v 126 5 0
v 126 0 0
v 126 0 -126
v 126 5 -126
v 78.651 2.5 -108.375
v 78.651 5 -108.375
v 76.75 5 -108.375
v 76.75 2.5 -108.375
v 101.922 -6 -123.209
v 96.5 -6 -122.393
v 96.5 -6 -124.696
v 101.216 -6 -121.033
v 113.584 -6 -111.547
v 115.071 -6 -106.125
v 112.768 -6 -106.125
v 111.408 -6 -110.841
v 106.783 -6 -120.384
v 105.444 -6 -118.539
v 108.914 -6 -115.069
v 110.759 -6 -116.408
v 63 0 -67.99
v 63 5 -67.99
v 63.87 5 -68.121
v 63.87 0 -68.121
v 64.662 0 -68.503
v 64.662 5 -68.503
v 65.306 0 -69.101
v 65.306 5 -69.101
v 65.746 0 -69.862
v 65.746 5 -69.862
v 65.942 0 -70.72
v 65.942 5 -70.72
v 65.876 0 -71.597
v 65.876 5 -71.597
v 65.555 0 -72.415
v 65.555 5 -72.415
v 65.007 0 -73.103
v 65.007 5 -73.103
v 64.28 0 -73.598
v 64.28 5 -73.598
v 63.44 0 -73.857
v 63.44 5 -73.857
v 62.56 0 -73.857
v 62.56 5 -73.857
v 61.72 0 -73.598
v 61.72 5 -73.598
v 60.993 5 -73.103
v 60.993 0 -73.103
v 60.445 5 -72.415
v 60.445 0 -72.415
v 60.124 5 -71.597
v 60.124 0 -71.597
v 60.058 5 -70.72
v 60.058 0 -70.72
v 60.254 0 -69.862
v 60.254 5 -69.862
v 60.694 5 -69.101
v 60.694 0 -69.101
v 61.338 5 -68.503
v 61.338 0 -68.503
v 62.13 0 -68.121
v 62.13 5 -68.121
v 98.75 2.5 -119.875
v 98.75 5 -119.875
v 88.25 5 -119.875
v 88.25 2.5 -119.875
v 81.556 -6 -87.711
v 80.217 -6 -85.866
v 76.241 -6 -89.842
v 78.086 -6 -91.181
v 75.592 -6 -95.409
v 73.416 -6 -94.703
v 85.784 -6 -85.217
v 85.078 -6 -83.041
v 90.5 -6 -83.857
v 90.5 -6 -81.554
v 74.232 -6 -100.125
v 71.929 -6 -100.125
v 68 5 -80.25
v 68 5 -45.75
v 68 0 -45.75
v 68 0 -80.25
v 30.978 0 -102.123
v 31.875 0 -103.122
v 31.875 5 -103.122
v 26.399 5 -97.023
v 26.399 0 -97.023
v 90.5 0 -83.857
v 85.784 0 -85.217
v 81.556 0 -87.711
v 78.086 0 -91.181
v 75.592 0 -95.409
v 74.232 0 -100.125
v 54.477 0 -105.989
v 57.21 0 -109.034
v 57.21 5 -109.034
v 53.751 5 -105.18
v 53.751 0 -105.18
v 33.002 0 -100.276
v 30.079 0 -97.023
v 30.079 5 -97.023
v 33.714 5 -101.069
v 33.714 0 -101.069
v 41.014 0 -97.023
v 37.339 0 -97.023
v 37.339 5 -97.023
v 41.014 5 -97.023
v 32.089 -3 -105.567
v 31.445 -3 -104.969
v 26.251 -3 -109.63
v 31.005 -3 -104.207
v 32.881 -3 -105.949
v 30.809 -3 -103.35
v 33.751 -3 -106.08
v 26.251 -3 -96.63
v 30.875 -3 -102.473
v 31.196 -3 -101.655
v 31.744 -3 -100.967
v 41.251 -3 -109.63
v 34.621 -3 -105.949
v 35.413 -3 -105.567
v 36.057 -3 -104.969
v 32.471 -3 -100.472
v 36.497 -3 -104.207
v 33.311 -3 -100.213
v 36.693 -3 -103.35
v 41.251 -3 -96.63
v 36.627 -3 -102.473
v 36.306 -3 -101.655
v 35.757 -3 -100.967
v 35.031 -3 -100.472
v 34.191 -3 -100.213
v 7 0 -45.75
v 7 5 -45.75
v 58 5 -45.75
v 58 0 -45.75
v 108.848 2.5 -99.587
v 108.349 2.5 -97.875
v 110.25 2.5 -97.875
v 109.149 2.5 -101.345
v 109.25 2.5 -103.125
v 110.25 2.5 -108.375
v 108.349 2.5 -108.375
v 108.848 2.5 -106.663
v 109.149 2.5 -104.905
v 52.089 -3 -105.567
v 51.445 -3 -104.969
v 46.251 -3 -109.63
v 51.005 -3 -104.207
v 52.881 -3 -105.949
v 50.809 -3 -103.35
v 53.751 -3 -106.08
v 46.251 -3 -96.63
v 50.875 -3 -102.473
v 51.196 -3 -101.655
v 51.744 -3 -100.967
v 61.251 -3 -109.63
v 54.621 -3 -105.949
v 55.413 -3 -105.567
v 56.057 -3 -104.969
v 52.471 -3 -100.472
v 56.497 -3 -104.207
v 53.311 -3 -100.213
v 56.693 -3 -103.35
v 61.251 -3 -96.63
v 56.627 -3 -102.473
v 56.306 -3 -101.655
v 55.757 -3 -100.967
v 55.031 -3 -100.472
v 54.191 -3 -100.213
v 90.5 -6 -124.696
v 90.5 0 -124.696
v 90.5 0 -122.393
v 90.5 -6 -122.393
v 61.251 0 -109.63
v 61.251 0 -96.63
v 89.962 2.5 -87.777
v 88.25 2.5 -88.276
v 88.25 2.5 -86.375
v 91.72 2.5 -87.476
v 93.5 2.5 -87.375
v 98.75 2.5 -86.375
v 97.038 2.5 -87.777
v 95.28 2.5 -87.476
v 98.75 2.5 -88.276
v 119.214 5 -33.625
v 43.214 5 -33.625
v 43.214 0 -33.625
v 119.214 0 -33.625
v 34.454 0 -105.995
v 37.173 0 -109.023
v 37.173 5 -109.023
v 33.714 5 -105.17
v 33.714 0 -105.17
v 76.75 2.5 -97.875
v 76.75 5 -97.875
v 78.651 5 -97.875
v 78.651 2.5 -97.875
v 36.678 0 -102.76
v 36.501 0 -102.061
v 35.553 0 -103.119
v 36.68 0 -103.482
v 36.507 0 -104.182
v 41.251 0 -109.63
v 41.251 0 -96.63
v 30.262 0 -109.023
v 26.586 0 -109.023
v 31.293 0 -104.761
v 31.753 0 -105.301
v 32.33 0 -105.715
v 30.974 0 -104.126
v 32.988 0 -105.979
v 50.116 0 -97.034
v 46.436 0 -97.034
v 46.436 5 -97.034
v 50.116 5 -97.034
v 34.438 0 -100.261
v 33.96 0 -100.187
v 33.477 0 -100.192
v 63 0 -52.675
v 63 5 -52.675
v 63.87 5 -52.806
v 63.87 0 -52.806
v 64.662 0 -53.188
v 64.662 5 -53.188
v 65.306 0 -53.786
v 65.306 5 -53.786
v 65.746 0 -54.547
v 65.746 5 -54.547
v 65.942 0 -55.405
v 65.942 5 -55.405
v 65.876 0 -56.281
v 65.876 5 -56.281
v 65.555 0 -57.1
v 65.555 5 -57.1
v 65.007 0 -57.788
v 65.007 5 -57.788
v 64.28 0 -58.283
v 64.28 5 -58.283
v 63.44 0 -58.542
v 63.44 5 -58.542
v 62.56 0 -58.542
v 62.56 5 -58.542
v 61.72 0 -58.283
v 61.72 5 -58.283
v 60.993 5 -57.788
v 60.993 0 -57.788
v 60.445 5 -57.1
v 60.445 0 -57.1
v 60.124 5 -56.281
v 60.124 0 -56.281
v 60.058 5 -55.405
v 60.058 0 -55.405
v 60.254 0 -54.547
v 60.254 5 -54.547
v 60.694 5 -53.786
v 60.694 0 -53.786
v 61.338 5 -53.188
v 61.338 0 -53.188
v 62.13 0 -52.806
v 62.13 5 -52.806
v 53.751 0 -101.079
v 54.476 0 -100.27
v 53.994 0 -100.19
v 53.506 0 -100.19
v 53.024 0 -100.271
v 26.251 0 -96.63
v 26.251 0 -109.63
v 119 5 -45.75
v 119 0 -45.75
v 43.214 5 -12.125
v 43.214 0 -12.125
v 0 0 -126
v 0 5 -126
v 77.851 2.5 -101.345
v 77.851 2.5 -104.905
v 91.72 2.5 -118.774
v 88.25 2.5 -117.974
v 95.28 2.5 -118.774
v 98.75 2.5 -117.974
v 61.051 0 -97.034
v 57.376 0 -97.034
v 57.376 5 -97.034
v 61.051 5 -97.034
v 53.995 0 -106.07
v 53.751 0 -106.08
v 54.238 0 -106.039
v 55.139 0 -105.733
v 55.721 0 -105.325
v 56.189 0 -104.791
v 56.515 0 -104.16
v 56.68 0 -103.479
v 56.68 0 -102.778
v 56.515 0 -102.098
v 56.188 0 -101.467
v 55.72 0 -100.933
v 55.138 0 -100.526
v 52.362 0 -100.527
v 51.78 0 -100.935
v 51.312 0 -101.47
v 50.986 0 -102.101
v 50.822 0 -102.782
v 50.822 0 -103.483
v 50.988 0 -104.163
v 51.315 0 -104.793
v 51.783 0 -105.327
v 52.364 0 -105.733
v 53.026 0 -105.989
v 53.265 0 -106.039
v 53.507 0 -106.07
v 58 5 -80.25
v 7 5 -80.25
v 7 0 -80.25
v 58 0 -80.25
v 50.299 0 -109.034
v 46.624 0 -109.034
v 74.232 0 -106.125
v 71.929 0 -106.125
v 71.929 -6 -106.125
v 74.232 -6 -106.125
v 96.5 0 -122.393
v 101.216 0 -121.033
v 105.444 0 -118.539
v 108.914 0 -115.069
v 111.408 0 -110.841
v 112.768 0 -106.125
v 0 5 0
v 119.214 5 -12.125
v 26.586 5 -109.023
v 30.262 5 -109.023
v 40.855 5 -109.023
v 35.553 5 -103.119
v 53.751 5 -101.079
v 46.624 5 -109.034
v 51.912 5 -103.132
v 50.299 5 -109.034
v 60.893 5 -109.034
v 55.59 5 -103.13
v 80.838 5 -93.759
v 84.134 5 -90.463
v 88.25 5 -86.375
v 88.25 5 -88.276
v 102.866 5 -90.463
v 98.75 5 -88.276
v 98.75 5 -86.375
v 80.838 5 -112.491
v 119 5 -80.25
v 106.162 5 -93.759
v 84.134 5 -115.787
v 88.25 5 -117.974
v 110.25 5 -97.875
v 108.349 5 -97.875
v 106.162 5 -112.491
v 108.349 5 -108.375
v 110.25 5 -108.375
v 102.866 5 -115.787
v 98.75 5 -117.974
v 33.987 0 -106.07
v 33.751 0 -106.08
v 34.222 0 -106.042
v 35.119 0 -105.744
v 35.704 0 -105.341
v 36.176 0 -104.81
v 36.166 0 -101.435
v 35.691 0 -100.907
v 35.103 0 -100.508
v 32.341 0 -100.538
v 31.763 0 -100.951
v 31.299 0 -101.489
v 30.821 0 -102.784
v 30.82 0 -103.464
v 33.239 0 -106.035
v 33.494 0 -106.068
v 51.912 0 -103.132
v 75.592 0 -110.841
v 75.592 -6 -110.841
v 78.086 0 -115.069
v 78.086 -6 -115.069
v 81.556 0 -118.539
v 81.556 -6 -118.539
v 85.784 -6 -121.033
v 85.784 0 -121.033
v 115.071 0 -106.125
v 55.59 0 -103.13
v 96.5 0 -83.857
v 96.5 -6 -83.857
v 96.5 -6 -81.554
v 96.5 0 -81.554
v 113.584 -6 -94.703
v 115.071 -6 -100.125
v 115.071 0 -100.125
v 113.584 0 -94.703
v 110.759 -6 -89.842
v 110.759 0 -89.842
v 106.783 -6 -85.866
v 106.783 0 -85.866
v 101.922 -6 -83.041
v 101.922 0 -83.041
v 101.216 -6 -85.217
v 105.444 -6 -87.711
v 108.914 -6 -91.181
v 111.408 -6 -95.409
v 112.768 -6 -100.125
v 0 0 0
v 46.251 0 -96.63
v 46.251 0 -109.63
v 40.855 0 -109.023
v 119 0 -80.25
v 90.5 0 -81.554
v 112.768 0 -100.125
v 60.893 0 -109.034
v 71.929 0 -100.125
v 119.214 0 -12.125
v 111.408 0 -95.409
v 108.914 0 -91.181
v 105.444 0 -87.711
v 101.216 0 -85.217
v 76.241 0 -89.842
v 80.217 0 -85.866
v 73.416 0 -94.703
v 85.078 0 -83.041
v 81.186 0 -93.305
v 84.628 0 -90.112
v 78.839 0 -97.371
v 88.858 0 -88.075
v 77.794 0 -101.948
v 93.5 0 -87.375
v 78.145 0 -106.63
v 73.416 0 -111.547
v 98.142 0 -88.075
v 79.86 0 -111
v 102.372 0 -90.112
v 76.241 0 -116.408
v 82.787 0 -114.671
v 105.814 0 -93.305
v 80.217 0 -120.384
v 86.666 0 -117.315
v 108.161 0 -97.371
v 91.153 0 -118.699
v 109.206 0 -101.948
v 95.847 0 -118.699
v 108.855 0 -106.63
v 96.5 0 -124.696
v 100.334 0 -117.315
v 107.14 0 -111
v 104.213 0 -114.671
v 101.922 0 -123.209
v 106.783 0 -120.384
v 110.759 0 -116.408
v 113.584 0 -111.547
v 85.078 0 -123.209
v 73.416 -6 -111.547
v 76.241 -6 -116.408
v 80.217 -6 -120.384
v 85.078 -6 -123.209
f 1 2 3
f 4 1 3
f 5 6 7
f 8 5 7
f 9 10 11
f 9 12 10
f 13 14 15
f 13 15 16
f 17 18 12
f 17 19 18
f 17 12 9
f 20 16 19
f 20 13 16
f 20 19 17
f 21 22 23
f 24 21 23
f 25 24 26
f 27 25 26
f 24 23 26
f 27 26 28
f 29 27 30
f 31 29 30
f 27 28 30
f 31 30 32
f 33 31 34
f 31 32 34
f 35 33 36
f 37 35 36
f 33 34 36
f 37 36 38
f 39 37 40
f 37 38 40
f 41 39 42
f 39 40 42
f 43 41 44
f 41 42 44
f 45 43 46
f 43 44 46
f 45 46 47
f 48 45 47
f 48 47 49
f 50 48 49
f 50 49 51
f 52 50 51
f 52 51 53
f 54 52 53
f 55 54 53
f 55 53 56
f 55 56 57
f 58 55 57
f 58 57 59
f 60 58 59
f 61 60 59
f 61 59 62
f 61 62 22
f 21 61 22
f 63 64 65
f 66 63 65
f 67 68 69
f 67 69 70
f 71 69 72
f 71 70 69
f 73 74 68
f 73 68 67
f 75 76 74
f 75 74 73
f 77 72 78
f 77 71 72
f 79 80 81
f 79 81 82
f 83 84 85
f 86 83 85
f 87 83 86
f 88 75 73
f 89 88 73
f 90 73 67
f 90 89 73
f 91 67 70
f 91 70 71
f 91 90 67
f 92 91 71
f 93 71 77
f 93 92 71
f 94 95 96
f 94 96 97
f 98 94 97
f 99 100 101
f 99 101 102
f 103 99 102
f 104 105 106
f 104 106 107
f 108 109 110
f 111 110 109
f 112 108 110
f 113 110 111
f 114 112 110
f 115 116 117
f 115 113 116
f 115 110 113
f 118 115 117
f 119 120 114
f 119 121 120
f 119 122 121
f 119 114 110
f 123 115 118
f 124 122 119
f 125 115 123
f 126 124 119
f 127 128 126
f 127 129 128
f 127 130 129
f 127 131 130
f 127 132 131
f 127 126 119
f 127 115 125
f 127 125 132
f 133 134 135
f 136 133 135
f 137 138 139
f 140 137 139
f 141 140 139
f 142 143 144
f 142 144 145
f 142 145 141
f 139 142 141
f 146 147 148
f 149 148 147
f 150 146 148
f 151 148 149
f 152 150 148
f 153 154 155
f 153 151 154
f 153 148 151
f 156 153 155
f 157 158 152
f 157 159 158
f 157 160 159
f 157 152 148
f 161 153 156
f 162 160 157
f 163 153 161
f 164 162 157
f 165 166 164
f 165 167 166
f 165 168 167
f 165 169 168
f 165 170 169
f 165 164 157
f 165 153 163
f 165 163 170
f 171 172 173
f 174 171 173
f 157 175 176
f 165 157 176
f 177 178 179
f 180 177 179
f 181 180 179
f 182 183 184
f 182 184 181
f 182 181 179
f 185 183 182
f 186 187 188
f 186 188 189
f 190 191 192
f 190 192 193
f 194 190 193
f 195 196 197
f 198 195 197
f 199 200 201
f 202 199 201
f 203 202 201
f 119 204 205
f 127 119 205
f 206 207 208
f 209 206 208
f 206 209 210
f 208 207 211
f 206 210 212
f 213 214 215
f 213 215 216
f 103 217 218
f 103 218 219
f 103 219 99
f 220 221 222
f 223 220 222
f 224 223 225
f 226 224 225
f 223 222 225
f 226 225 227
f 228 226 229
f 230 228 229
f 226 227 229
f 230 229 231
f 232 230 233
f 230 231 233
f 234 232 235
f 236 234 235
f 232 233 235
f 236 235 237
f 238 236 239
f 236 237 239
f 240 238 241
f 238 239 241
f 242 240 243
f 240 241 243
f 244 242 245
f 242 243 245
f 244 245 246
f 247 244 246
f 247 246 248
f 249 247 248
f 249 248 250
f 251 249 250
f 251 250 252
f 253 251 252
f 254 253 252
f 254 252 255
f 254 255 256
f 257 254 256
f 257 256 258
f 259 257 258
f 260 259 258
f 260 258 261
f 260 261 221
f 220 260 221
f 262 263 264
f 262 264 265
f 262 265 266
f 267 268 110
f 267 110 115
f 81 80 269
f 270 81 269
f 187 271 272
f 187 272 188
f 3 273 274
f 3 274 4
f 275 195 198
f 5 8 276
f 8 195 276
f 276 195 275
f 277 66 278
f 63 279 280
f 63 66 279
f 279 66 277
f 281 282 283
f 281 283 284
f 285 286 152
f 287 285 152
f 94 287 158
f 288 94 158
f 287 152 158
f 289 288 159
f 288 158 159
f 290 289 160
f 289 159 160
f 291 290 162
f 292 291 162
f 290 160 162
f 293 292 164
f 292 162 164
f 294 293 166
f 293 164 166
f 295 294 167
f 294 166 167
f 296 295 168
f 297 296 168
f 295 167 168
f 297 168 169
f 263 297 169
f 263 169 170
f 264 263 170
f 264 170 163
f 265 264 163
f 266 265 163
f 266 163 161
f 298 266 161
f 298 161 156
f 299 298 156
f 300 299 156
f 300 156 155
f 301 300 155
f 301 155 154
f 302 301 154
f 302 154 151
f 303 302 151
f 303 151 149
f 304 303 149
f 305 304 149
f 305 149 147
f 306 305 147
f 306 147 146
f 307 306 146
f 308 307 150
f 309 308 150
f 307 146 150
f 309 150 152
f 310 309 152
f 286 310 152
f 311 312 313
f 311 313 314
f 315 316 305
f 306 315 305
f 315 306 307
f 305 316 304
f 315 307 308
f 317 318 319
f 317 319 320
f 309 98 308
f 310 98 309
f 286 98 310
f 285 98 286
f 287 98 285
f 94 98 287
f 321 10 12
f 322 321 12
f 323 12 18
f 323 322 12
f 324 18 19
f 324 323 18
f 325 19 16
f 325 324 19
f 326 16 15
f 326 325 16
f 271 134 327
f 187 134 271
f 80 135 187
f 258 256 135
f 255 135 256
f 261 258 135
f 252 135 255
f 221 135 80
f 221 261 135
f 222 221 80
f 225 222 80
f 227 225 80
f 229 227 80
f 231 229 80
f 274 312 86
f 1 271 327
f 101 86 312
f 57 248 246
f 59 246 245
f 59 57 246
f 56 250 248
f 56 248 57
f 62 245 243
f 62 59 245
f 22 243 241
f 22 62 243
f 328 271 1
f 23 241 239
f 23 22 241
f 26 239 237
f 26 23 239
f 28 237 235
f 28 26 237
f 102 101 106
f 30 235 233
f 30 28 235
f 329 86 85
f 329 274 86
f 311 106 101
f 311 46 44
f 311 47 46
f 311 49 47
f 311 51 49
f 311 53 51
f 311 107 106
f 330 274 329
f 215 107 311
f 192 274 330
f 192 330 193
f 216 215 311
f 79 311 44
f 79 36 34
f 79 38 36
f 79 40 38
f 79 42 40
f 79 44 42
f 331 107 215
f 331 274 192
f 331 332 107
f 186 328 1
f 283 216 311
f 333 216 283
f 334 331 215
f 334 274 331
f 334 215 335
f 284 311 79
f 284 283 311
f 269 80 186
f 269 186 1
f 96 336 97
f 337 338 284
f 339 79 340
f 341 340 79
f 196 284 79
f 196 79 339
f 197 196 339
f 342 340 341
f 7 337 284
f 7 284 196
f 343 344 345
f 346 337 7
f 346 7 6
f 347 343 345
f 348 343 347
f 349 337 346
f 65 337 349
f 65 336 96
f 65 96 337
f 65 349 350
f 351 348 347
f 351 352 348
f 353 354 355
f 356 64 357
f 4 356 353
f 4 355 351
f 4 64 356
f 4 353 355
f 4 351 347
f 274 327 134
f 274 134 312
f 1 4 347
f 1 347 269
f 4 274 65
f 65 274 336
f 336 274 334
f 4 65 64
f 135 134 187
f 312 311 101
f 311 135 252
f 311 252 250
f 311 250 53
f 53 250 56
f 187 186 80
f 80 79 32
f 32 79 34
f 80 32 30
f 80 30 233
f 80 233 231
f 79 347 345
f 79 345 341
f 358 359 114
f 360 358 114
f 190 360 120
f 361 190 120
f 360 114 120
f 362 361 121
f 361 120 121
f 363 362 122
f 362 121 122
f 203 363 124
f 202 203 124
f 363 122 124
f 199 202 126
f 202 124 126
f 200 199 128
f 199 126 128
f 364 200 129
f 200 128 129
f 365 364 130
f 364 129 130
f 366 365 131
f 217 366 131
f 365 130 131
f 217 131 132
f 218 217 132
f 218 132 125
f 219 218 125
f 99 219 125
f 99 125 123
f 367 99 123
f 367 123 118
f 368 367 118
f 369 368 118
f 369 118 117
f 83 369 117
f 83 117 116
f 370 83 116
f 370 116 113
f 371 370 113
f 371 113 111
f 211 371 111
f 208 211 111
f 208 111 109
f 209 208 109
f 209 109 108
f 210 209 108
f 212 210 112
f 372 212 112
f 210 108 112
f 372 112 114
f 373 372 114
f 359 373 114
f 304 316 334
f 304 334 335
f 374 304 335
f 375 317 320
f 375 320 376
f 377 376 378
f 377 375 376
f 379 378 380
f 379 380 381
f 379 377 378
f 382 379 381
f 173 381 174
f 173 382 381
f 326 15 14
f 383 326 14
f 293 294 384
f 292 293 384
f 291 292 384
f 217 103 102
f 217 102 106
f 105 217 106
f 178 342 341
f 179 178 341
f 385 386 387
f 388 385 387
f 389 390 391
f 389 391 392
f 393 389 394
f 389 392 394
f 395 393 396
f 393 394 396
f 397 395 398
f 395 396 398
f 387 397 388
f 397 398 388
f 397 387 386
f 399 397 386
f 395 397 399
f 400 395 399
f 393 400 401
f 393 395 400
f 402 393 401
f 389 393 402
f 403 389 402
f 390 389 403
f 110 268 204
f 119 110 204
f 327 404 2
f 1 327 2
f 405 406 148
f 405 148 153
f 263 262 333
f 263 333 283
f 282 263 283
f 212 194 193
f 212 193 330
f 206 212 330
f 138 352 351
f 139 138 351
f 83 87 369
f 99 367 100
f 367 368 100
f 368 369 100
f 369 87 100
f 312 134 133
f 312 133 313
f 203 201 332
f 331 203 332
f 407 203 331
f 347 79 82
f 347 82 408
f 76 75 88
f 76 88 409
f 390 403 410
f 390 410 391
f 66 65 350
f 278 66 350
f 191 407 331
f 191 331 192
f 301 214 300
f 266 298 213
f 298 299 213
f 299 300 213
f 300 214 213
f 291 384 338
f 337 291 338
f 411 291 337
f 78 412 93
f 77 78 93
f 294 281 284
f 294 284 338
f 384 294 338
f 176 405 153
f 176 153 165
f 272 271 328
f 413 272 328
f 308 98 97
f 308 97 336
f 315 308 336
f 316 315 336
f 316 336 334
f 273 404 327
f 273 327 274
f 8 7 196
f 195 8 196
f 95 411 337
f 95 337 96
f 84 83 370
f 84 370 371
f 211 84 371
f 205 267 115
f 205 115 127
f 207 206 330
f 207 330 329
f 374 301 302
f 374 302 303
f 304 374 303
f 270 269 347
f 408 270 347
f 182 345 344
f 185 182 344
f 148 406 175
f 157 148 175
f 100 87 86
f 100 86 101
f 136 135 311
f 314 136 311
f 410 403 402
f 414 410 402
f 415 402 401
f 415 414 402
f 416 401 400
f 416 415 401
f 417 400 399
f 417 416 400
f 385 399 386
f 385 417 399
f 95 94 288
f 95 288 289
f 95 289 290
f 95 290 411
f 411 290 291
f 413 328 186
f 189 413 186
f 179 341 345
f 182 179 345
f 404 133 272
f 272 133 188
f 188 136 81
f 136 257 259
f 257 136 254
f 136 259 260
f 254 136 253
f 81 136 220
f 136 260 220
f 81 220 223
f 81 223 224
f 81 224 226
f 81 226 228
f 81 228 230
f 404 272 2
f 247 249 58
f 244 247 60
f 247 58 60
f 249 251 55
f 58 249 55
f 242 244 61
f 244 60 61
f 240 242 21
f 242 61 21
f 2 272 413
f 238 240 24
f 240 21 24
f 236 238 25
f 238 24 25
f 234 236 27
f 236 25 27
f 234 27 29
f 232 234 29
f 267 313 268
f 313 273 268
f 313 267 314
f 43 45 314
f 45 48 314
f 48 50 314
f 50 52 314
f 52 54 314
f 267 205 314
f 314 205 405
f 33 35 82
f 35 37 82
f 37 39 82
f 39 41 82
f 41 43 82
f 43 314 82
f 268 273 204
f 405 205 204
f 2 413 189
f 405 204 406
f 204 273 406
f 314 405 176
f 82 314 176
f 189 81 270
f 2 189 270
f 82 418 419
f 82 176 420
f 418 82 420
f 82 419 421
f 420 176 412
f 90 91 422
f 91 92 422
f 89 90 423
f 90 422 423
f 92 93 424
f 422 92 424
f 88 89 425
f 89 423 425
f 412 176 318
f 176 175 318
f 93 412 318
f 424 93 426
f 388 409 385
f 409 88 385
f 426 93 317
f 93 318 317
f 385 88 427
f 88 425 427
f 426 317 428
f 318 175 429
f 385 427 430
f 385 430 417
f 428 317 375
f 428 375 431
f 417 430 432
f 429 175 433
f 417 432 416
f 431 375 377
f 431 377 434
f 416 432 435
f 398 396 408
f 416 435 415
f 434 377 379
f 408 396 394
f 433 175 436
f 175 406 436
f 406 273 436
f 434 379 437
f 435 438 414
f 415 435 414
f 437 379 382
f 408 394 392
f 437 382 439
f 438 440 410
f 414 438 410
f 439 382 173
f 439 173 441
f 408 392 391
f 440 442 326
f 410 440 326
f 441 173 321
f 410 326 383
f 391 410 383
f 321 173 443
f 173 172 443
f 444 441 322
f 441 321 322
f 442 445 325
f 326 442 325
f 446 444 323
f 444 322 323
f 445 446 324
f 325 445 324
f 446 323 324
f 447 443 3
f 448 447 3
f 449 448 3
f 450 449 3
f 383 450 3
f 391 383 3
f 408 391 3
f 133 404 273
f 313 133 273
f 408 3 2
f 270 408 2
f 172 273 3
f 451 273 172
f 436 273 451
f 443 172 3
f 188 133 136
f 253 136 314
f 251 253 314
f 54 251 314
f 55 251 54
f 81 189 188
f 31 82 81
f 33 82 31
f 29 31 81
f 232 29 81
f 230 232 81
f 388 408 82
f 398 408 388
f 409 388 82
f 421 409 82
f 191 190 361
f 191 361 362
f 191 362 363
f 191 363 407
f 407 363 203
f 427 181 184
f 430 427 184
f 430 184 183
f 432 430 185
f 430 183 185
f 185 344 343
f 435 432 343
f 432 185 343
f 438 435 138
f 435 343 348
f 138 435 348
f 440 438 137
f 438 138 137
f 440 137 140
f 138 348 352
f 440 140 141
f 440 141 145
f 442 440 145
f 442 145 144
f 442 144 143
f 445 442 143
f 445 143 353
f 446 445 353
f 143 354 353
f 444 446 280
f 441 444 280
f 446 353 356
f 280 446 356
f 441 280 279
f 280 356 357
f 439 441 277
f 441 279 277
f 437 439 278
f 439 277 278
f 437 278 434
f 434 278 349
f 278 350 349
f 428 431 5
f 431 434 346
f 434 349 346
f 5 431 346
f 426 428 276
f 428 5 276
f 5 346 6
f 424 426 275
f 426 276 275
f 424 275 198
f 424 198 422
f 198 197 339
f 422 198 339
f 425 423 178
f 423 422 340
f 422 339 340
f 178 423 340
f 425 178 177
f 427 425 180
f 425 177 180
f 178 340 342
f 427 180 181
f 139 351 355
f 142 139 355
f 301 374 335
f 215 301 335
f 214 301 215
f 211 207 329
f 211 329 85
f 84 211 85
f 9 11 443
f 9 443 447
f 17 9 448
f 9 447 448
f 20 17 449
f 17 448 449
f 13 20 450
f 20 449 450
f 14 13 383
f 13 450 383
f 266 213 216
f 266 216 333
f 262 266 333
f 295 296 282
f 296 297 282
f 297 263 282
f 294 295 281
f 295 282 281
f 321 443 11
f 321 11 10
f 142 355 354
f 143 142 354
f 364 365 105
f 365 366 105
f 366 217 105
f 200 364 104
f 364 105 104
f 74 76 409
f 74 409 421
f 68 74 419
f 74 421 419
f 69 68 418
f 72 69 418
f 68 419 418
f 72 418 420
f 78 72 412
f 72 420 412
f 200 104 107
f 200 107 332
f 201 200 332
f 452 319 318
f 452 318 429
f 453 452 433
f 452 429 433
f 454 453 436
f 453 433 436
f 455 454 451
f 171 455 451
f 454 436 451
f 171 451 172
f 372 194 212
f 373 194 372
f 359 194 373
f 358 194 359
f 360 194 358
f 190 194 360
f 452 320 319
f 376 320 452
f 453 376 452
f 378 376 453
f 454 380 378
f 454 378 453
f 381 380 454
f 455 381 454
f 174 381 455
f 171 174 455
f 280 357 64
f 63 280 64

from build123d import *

# Parameters (mm, degrees)
SKETCH1_W           = 126
SKETCH1_H           = 126
BOSS_EXTRUDE1_DEPTH = 5
SKETCH4_W           = 76
SKETCH4_H           = 21.5
CUT_EXTRUDE3_DEPTH  = 10
CUT_EXTRUDE4_START  = -5
CUT_EXTRUDE4_DEPTH  = 5
SKETCH11_W          = 15
SKETCH11_H          = 13
BOSS_EXTRUDE2_DEPTH = 3
SKETCH12_R          = 2.95
CUT_EXTRUDE5_DEPTH  = 3
LPATTERN1_COUNT     = 2
LPATTERN1_PITCH     = 20
LPATTERN2_COUNT     = 2
LPATTERN2_PITCH     = 20
SKETCH13_W          = 51
SKETCH13_H          = 34.5
CUT_EXTRUDE6_DEPTH  = 179.370401132
SKETCH14_W          = 51
SKETCH14_H          = 34.5
CUT_EXTRUDE7_DEPTH  = 179.370401132
SKETCH17_R          = 2.95
CUT_EXTRUDE10_DEPTH = 179.370401132
SKETCH18_R          = 21.778665512
SKETCH18_R_2        = 19.5
BOSS_EXTRUDE3_DEPTH = 6
SKETCH19_W          = 44.860431558
SKETCH19_H          = 6
SKETCH19_W_2        = 6
SKETCH19_H_2        = 44.549983506
CUT_EXTRUDE11_DEPTH = 6
SKETCH21_R          = 15.75
CUT_EXTRUDE14_DEPTH = 179.530109505
CUT_EXTRUDE15_DEPTH = 2.5


# Read off the part's stored shape, not the designer's step: Cut-Extrude4
with BuildPart() as part:
    # Sketch1 → Boss-Extrude1 (new body)
    with BuildSketch(Plane(origin=(0, 0, 0), x_dir=(1, 0, 0), z_dir=(0, 1, 0))):
        with Locations((63, 63)):
            Rectangle(SKETCH1_W, SKETCH1_H)
    extrude(amount=BOSS_EXTRUDE1_DEPTH)

    # Sketch4 → Cut-Extrude3 (cut)
    with BuildSketch(Plane(origin=(0, 5, 0), x_dir=(1, 0, 0), z_dir=(0, 1, 0))):
        with Locations((81.213909597, 22.875)):
            Rectangle(SKETCH4_W, SKETCH4_H)
    extrude(amount=-CUT_EXTRUDE3_DEPTH, mode=Mode.SUBTRACT)

    # Cut-Extrude4 outline → Cut-Extrude4 (cut)
    with BuildSketch(Plane(origin=(0, 5, 0), x_dir=(1, 0, 0), z_dir=(0, 1, 0)).offset(CUT_EXTRUDE4_START)):
        Polygon((46.623568796, 109.033538796), (51.912030335, 103.132096488), (46.436068796, 97.033538796), (50.116357258, 97.033538796), (53.750972642, 101.079211873), (57.375972642, 97.033538796), (61.051453412, 97.033538796), (55.58991495, 103.129692642), (60.892799565, 109.033538796), (57.210107258, 109.033538796), (53.750972642, 105.180173411), (50.299049565, 109.033538796), align=None)
        Polygon((26.586259271, 109.023073742), (31.87472081, 103.121631435), (26.398759271, 97.023073742), (30.079047733, 97.023073742), (33.713663117, 101.068746819), (37.338663117, 97.023073742), (41.014143886, 97.023073742), (35.552605425, 103.119227588), (40.85549004, 109.023073742), (37.172797733, 109.023073742), (33.713663117, 105.169708358), (30.26174004, 109.023073742), align=None)
    extrude(amount=CUT_EXTRUDE4_DEPTH, mode=Mode.SUBTRACT)

    # Sketch11 → Boss-Extrude2 (add)
    with BuildSketch(Plane.XZ):
        with Locations((53.750972642, -103.129692642)):
            Rectangle(SKETCH11_W, SKETCH11_H)
    boss_extrude2 = extrude(amount=BOSS_EXTRUDE2_DEPTH)

    # Sketch12 → Cut-Extrude5 (cut)
    with BuildSketch(Plane.XZ.offset(3)):
        with Locations(Location((53.750972642, -103.129692642, 0), (0, 0, 270))):
            Circle(SKETCH12_R)
    cut_extrude5 = extrude(amount=-CUT_EXTRUDE5_DEPTH, mode=Mode.SUBTRACT)

    # LPattern1: Boss-Extrude2 ×2
    with Locations(*[(-i * LPATTERN1_PITCH, 0, 0) for i in range(1, LPATTERN1_COUNT)]):
        add(boss_extrude2)

    # LPattern2: Cut-Extrude5 ×2
    with Locations(*[(-i * LPATTERN2_PITCH, 0, 0) for i in range(1, LPATTERN2_COUNT)]):
        add(cut_extrude5, mode=Mode.SUBTRACT)

    # Sketch13 → Cut-Extrude6 (cut, through all)
    with BuildSketch(Plane(origin=(0, 5, 0), x_dir=(1, 0, 0), z_dir=(0, 1, 0))):
        with Locations((32.5, 63)):
            Rectangle(SKETCH13_W, SKETCH13_H)
    extrude(amount=-CUT_EXTRUDE6_DEPTH, mode=Mode.SUBTRACT)

    # Sketch14 → Cut-Extrude7 (cut, through all)
    with BuildSketch(Plane(origin=(0, 5, 0), x_dir=(1, 0, 0), z_dir=(0, 1, 0))):
        with Locations((93.5, 63)):
            Rectangle(SKETCH14_W, SKETCH14_H)
    extrude(amount=-CUT_EXTRUDE7_DEPTH, mode=Mode.SUBTRACT)

    # Sketch17 → Cut-Extrude10 (cut, through all)
    with BuildSketch(Plane(origin=(0, 5, 0), x_dir=(1, 0, 0), z_dir=(0, 1, 0))):
        with Locations(Location((63, 55.625, 0), (0, 0, 270))):
            Circle(SKETCH17_R)
        with Locations(Location((63, 70.940065171, 0), (0, 0, 270))):
            Circle(SKETCH17_R)
    extrude(amount=-CUT_EXTRUDE10_DEPTH, mode=Mode.SUBTRACT)

    # Sketch18 → Boss-Extrude3 (add)
    with BuildSketch(Plane.XZ):
        with Locations(Location((93.5, -103.125, 0), (0, 0, 270))):
            Circle(SKETCH18_R)
        with Locations(Location((93.5, -103.125, 0), (0, 0, 270))):
            Circle(SKETCH18_R_2, mode=Mode.SUBTRACT)
    extrude(amount=BOSS_EXTRUDE3_DEPTH)

    # Sketch19 → Cut-Extrude11 (cut)
    with BuildSketch(Plane.XZ.offset(6)):
        with Locations((93.5, -103.125)):
            Rectangle(SKETCH19_W, SKETCH19_H)
        with Locations((93.5, -103.125)):
            Rectangle(SKETCH19_W_2, SKETCH19_H_2)
    extrude(amount=-CUT_EXTRUDE11_DEPTH, mode=Mode.SUBTRACT)

    # Sketch21 → Cut-Extrude14 (cut, through all)
    with BuildSketch(Plane(origin=(0, 5, 0), x_dir=(1, 0, 0), z_dir=(0, 1, 0))):
        with Locations(Location((93.5, 103.125, 0), (0, 0, 270))):
            Circle(SKETCH21_R)
    extrude(amount=-CUT_EXTRUDE14_DEPTH, mode=Mode.SUBTRACT)

    # Sketch22 → Cut-Extrude15 (cut)
    with BuildSketch(Plane(origin=(0, 5, 0), x_dir=(1, 0, 0), z_dir=(0, 1, 0))):
        with BuildLine():
            ThreePointArc((78.650757595, 97.875), (77.75, 103.125), (78.650757595, 108.375))
            Line((78.650757595, 108.375), (76.75, 108.375))
            Line((76.75, 108.375), (76.75, 97.875))
            Line((76.75, 97.875), (78.650757595, 97.875))
        make_face()
        with BuildLine():
            ThreePointArc((88.25, 117.974242405), (93.5, 118.875), (98.75, 117.974242405))
            Line((98.75, 117.974242405), (98.75, 119.875))
            Line((98.75, 119.875), (88.25, 119.875))
            Line((88.25, 119.875), (88.25, 117.974242405))
        make_face()
        with BuildLine():
            Line((110.25, 97.875), (110.25, 108.375))
            Line((110.25, 108.375), (108.349242405, 108.375))
            ThreePointArc((108.349242405, 108.375), (109.023177315, 105.788356165), (109.25, 103.125))
            ThreePointArc((109.25, 103.125), (109.023177315, 100.461643835), (108.349242405, 97.875))
            Line((108.349242405, 97.875), (110.25, 97.875))
        make_face()
        with BuildLine():
            Line((98.75, 86.375), (98.75, 88.275757595))
            ThreePointArc((98.75, 88.275757595), (93.5, 87.375), (88.25, 88.275757595))
            Line((88.25, 88.275757595), (88.25, 86.375))
            Line((88.25, 86.375), (98.75, 86.375))
        make_face()
    extrude(amount=-CUT_EXTRUDE15_DEPTH, mode=Mode.SUBTRACT)


solid = part.part
